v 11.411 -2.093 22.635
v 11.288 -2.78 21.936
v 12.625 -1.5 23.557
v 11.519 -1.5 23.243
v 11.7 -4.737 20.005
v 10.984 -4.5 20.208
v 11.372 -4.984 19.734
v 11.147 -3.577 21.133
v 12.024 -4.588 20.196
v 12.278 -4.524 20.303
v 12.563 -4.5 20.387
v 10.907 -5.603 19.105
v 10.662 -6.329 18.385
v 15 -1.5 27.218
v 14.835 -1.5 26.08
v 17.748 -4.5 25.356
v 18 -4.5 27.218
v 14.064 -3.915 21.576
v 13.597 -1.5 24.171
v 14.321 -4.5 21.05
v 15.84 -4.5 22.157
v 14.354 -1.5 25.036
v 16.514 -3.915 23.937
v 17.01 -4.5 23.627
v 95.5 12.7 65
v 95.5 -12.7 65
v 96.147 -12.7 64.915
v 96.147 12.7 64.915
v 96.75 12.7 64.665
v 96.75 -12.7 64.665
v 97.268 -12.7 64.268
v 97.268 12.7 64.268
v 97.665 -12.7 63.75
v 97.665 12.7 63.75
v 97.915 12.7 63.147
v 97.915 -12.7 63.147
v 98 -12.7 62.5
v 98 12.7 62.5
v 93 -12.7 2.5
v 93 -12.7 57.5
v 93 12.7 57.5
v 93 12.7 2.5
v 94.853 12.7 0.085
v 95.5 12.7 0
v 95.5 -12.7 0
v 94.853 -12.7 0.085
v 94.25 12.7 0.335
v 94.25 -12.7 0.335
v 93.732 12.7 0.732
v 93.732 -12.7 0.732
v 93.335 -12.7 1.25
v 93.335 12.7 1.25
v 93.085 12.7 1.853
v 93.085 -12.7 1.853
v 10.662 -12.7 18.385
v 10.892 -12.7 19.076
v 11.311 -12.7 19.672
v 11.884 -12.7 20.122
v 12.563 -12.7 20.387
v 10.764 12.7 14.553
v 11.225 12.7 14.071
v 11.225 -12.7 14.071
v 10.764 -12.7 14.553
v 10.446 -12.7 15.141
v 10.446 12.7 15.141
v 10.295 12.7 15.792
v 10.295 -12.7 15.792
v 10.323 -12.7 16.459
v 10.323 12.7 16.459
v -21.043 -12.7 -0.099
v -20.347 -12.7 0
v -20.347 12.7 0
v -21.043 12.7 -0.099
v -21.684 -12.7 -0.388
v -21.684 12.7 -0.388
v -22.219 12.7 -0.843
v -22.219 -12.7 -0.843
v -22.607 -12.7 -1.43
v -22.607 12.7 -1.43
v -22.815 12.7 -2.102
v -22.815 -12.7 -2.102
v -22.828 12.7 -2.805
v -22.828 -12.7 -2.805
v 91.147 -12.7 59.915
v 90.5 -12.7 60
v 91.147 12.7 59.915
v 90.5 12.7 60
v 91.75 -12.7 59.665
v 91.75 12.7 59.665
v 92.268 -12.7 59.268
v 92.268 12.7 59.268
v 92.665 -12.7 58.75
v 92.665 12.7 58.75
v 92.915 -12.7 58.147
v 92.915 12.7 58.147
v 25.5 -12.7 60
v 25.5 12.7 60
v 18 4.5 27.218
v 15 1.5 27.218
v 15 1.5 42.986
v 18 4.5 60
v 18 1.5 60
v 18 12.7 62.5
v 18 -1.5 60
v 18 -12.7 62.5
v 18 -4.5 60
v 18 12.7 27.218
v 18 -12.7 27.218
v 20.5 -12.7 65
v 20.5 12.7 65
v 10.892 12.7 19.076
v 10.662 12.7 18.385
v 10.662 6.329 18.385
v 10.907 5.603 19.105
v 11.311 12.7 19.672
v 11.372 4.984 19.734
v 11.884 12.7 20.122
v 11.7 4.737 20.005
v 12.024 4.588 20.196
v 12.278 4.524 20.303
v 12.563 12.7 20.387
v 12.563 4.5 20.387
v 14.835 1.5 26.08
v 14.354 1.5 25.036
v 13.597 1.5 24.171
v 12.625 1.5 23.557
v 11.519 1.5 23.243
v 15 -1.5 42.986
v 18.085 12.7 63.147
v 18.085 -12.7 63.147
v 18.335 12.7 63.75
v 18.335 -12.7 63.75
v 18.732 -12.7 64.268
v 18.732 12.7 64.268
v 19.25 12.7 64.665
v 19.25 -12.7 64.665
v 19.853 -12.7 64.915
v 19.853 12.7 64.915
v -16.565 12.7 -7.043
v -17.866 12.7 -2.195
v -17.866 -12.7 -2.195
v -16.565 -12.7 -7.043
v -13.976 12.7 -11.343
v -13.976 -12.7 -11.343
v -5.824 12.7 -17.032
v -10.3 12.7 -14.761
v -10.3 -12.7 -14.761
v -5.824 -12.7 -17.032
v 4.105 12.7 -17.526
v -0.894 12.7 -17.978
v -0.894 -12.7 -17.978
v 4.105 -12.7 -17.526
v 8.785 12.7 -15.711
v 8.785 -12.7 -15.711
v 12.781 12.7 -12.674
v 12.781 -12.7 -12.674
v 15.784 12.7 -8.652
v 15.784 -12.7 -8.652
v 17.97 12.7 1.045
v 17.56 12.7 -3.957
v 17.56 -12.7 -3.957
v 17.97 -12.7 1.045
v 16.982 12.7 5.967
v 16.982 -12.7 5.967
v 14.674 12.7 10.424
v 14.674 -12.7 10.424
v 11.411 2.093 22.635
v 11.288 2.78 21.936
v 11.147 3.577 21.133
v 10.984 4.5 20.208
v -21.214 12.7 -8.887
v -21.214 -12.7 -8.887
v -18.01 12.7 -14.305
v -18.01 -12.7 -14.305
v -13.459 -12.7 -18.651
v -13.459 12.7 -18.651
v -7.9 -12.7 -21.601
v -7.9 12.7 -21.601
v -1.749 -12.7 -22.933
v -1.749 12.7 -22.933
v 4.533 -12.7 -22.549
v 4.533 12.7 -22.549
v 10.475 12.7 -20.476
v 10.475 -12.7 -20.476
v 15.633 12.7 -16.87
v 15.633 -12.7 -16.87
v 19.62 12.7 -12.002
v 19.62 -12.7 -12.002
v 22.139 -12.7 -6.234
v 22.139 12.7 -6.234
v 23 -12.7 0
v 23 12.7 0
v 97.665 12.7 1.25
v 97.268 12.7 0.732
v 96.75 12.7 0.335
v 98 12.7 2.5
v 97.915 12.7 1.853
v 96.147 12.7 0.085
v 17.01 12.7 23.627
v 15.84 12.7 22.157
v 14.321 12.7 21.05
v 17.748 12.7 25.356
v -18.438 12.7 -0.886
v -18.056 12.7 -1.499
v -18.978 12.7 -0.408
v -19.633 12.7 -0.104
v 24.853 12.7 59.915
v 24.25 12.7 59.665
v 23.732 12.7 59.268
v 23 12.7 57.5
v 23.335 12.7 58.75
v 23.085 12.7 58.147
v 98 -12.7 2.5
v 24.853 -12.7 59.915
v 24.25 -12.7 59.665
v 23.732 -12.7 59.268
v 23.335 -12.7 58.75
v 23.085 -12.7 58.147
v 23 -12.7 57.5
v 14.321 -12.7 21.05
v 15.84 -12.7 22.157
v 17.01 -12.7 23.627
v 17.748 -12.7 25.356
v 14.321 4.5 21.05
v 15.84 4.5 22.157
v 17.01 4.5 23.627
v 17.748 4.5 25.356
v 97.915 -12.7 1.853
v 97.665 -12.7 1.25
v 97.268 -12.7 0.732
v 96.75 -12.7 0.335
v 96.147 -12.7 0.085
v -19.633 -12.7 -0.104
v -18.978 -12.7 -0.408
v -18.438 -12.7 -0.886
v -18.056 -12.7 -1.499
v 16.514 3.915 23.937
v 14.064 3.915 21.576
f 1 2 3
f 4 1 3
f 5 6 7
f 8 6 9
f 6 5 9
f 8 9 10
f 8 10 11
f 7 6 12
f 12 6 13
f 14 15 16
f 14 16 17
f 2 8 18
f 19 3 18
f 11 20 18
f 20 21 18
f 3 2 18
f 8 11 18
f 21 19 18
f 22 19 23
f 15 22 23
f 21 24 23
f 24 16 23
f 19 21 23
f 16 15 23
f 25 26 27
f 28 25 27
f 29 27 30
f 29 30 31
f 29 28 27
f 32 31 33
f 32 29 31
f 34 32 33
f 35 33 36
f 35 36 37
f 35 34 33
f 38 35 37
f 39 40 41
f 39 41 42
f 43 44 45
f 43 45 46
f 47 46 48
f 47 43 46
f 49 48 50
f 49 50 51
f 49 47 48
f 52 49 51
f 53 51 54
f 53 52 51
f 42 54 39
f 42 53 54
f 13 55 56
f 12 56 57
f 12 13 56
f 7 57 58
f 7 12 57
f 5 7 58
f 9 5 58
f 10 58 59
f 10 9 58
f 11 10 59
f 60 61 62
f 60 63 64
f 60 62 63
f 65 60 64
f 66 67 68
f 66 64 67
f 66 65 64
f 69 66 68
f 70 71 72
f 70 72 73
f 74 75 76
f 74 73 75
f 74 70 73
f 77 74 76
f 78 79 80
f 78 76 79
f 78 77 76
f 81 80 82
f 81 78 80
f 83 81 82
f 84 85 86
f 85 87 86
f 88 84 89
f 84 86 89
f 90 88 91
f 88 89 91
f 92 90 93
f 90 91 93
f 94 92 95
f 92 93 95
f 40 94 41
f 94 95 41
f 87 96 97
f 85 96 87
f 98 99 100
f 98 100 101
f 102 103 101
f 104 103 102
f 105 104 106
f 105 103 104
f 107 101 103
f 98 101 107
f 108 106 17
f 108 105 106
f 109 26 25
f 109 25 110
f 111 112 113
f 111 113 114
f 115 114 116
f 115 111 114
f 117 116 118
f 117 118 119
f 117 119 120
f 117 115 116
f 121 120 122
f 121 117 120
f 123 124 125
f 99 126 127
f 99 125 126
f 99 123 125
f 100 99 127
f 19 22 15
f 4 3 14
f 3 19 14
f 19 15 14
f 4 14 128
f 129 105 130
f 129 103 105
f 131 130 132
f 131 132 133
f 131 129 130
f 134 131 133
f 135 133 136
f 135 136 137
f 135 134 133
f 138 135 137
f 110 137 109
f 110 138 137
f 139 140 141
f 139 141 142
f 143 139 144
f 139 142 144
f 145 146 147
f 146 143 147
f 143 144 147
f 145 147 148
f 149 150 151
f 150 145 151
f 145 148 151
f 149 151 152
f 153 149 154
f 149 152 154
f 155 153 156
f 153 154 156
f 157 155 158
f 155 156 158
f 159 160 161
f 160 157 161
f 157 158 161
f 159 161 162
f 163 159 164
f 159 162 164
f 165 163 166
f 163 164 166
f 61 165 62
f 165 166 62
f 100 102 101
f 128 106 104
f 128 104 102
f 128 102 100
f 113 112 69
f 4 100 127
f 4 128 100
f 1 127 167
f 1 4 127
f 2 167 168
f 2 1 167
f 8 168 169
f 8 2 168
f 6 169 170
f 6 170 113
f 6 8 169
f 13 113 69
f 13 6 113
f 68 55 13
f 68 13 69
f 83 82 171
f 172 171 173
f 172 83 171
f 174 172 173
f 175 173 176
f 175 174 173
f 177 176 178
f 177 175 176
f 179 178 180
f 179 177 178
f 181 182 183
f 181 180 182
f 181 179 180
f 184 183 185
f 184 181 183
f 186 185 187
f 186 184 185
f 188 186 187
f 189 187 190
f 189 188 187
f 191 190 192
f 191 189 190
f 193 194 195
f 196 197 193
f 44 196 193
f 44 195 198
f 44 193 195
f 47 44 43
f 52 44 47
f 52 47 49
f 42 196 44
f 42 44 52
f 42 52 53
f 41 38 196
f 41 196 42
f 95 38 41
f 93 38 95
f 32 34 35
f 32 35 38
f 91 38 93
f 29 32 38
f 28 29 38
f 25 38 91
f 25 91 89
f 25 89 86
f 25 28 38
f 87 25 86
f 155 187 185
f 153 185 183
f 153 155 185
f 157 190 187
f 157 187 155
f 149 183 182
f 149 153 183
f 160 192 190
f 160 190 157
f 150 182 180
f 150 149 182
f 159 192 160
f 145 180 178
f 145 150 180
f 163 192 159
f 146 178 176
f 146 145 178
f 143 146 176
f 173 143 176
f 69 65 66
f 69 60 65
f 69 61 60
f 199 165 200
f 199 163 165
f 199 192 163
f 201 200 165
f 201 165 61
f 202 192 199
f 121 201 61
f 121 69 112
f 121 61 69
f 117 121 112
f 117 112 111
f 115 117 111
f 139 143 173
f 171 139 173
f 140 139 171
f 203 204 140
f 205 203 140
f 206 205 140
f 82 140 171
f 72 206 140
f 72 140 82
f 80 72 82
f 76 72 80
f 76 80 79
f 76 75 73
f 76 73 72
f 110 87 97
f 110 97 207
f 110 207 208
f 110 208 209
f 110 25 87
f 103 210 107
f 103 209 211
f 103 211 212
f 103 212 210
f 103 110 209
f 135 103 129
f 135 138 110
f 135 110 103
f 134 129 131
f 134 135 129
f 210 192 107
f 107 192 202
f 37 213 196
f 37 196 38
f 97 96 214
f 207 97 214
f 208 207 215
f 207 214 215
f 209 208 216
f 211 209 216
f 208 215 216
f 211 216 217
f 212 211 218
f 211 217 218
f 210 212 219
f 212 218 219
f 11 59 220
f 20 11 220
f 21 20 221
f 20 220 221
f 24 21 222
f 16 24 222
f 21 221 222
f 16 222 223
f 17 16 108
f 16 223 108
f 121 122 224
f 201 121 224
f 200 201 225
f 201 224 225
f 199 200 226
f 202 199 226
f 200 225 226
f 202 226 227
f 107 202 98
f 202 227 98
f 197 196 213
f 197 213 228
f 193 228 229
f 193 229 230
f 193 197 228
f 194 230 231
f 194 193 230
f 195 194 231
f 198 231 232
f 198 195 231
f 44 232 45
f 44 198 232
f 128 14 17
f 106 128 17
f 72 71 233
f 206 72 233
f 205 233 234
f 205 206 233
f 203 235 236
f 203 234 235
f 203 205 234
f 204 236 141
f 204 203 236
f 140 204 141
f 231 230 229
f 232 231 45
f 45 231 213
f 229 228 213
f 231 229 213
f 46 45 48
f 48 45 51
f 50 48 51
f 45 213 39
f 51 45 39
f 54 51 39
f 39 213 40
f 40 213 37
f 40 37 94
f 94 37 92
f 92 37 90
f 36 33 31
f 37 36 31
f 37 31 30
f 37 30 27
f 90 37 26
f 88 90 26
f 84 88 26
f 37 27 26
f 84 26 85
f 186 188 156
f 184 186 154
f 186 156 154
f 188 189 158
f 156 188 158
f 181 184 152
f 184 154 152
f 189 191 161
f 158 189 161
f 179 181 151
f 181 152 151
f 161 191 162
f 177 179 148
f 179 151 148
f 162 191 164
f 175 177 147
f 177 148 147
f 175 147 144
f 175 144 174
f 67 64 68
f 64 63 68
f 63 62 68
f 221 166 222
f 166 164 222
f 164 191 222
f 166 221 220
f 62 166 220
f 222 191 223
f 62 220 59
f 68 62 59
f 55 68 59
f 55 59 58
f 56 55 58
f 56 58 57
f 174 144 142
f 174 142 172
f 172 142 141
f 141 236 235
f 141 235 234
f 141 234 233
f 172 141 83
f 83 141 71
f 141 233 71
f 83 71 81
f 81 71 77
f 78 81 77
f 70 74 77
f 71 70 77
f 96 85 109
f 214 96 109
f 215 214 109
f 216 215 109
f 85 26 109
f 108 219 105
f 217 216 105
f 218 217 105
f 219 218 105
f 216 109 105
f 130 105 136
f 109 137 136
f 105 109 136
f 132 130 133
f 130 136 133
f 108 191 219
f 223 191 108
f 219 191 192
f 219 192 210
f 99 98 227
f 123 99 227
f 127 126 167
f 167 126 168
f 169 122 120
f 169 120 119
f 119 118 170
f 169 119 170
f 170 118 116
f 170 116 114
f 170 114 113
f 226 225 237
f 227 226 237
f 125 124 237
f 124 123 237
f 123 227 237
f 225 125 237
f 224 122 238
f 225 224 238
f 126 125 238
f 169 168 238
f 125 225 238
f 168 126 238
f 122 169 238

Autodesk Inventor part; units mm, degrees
ref_plane "YZ Plane" through (0, 0, 0) normal (1, 0, 0) x (0, 1, 0)
ref_plane "XZ Plane" through (0, 0, 0) normal (0, 1, 0) x (-1, 0, 0)
ref_plane "XY Plane" through (0, 0, 0) normal (0, 0, 1) x (1, 0, 0)
sketch "Sketch1" plane through (0, 0, 0) normal (0, 1, 0) x (-1, 0, 0)
  circle A0 centre (0, 0) radius 18
  circle A1 centre (0, 0) radius 23
  line L0 (-98, 65) -> (-18, 65)
  line L1 (-18, 65) -> (-18, 0)
  line L2 (-98, 0) -> (-98, 65)
  line L3 (-23, 60) -> (-93, 60)
  line L4 (-93, 60) -> (-93, 0)
  line L5 (-23, 0) -> (-23, 60)
  line L6 (-93, 0) -> (-98, 0)
  line L7 (-18, 60) -> (-10.0531, 14.931)
  line L8 (23, 0) -> (-23, 0)
  point P0 (18, 0)
  point P1 (-10.9836, 20.2079)
  point P2 (-18, 14.3178)
  dimension "d0" = 36
  dimension "d1" = 5
  dimension "d10" = 5
  dimension "d11" = 5
  dimension "d13" = 60
  dimension "d14" = 70
  dimension "d15" = 10
extrude "Extrusion1" add sketch "Sketch1" along normal mid plane 25.4 contours L8 A1 A0 | A0 L1 A1 L7 | L8 A1 L1 | A1 L5 L3 L4 L6 L2 L0 L1
fillet "Fillet1" radius 7.0104 1 edges at (18, 0, 14.3178)
extrude "Extrusion2" add sketch "Sketch1" along normal mid plane 3 contours A1 L1 L7
chamfer "Chamfer1" distance 3 angle 45 4 edges at (15.9446, 1.5, 22.2591) (18, 1.5, 43.6092) (15.9446, -1.5, 22.2591) (18, -1.5, 43.6092)
fillet "Fillet2" radius 2.5 11 edges at (18, 0, 65) (98, 0, 65) (98, 0, 0) (93, 0, 0) (23, 0, 60) (93, 0, 60) (-18, 0, 0) (-23, 0, 0) (10.0531, 0, 14.931) (10.9836, 8.6, 20.2079) (10.9836, -8.6, 20.2079)
equation "\"d10\" = d1"
equation "\"d11\" = d1"
properties part number "Clip"
